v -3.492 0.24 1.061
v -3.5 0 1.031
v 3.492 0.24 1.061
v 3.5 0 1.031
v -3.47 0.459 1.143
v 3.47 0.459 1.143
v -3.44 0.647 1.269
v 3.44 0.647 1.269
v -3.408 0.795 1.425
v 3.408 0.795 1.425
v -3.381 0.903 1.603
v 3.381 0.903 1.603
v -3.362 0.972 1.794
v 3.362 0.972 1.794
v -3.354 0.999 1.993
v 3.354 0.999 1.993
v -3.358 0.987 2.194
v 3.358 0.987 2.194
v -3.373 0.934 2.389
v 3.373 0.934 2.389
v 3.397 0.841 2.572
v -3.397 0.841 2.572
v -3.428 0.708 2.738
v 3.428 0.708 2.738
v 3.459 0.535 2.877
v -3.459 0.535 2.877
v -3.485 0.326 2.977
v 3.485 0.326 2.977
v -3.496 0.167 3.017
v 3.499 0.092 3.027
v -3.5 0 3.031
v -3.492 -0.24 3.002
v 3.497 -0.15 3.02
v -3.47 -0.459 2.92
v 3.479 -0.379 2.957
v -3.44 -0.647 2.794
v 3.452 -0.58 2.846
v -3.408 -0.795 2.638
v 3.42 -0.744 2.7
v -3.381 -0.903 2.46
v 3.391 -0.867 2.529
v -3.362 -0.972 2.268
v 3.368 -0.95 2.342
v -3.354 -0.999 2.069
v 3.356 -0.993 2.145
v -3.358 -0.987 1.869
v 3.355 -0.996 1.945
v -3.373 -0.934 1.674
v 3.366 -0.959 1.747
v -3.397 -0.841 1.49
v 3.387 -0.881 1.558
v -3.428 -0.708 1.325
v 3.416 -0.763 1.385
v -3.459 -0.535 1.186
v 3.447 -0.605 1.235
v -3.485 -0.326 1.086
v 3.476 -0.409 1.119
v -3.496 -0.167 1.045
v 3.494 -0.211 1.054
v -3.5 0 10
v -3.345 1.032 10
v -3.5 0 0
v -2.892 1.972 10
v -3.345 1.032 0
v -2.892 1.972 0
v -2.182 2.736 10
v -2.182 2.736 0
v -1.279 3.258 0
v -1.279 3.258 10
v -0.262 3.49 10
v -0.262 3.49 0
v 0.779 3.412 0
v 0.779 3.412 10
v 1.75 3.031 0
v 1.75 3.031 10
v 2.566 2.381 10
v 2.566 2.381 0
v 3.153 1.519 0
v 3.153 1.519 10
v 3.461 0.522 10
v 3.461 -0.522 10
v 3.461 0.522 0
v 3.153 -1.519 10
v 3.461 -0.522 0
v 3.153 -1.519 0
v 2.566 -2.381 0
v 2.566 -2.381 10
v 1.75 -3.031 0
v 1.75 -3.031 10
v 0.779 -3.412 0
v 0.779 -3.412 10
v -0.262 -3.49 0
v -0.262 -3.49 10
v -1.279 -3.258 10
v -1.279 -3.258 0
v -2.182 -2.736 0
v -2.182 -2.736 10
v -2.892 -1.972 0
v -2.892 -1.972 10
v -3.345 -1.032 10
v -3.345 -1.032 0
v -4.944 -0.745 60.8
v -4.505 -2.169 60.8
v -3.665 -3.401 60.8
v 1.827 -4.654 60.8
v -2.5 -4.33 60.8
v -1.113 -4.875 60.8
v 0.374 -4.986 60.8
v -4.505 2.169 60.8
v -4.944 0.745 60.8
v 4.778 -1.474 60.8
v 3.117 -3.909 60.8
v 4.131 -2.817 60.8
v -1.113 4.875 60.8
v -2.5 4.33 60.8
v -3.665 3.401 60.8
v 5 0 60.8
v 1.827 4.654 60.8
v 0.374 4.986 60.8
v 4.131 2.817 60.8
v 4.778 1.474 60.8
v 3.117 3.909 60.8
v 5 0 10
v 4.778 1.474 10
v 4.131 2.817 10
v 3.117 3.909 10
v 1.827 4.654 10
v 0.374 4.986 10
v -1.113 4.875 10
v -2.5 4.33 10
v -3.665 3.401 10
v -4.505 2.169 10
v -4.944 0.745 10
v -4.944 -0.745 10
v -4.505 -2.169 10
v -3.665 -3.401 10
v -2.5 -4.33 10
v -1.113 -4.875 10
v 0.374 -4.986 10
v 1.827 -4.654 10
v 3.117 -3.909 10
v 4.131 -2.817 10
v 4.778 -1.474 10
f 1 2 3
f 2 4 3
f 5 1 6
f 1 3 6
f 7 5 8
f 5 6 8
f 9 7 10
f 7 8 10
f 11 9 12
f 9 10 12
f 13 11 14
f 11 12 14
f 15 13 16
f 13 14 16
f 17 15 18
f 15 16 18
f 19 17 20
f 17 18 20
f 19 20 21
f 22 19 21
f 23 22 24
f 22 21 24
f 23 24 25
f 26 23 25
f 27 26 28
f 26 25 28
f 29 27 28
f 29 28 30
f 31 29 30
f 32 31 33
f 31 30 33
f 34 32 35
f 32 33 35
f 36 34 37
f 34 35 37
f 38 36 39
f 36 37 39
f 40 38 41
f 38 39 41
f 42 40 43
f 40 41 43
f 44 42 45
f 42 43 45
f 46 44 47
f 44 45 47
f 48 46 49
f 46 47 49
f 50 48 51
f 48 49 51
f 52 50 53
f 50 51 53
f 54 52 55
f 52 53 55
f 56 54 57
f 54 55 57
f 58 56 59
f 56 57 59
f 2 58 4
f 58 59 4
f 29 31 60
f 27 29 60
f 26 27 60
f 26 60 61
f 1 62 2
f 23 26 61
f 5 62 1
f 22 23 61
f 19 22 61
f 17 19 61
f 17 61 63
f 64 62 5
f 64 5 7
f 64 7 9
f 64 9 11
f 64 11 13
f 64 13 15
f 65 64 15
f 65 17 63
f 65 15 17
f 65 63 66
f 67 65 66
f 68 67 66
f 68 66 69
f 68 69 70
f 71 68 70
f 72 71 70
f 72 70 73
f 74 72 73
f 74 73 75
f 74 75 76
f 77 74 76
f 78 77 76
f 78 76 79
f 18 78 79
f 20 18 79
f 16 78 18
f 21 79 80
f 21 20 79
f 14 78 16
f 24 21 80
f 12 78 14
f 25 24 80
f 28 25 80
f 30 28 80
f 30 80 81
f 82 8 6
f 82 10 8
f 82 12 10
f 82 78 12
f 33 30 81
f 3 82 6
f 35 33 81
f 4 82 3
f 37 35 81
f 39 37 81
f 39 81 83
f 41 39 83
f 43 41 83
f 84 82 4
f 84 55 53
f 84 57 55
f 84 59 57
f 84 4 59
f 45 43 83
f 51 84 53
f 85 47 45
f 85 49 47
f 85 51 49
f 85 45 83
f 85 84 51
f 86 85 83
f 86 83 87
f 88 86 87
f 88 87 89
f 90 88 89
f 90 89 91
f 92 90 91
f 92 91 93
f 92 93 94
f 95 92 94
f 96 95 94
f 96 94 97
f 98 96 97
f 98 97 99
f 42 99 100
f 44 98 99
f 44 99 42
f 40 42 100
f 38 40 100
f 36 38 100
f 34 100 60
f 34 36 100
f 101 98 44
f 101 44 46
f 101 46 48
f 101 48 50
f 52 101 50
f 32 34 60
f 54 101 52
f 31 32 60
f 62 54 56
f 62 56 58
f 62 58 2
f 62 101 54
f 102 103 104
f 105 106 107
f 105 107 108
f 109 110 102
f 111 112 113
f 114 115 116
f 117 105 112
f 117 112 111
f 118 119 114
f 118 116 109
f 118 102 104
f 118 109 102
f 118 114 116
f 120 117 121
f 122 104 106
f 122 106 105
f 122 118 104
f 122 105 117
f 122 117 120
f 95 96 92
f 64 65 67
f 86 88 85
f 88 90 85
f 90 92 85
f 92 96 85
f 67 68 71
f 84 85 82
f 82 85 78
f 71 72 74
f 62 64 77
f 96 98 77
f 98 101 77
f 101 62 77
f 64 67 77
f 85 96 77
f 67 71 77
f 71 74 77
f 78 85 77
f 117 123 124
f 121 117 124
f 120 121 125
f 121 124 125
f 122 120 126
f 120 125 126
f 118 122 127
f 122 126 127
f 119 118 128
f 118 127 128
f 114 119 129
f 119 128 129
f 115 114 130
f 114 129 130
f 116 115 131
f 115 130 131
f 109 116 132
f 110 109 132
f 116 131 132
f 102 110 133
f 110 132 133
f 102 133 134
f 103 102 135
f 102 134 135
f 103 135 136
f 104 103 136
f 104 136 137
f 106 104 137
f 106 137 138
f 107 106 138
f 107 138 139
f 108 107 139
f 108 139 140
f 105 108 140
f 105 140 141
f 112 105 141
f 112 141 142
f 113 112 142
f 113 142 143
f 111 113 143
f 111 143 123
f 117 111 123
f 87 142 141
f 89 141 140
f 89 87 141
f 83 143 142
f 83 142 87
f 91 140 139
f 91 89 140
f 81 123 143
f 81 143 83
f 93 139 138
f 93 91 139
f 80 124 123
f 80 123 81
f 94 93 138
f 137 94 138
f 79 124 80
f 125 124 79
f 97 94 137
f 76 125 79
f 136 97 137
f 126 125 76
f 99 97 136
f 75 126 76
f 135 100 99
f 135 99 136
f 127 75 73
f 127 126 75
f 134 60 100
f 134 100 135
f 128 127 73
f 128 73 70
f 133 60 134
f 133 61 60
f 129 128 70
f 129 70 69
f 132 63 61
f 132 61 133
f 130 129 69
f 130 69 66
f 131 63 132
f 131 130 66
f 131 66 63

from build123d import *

# Parameters (mm, degrees)
SKETCH1_R               = 5
BOSS_EXTRUDE1_DEPTH     = 60.8
SKETCH2_R               = 1
CUT_EXTRUDE1_DEPTH      = 6
CUT_EXTRUDE1_DEPTH_BACK = 6
SKETCH3_OUTSIDE_W       = 24.484
SKETCH3_OUTSIDE_H       = 24.484
SKETCH3_OUTSIDE_R       = 3.5
CUT_EXTRUDE2_DEPTH      = 10


with BuildPart() as part:
    # Sketch1 → Boss-Extrude1 (new body)
    with BuildSketch(Plane.XY):
        Circle(SKETCH1_R)
    extrude(amount=BOSS_EXTRUDE1_DEPTH)

    # Sketch2 → Cut-Extrude1 (cut, two sides)
    with BuildSketch(Plane(origin=(0, 0, 0), x_dir=(0, 0, -1), z_dir=(1, 0, 0))) as cut_extrude1_sk:
        with Locations((-2.031417136, 0)):
            Circle(SKETCH2_R)
    extrude(amount=CUT_EXTRUDE1_DEPTH, mode=Mode.SUBTRACT)
    extrude(cut_extrude1_sk.sketch, amount=-CUT_EXTRUDE1_DEPTH_BACK, mode=Mode.SUBTRACT)

    # Sketch3 outside → Cut-Extrude2 (cut)
    with BuildSketch(Plane(origin=(0, 0, 0), x_dir=(-1, 0, 0), z_dir=(0, 0, -1))):
        Rectangle(SKETCH3_OUTSIDE_W, SKETCH3_OUTSIDE_H)
        Circle(SKETCH3_OUTSIDE_R, mode=Mode.SUBTRACT)
    extrude(amount=-CUT_EXTRUDE2_DEPTH, mode=Mode.SUBTRACT)


solid = part.part
